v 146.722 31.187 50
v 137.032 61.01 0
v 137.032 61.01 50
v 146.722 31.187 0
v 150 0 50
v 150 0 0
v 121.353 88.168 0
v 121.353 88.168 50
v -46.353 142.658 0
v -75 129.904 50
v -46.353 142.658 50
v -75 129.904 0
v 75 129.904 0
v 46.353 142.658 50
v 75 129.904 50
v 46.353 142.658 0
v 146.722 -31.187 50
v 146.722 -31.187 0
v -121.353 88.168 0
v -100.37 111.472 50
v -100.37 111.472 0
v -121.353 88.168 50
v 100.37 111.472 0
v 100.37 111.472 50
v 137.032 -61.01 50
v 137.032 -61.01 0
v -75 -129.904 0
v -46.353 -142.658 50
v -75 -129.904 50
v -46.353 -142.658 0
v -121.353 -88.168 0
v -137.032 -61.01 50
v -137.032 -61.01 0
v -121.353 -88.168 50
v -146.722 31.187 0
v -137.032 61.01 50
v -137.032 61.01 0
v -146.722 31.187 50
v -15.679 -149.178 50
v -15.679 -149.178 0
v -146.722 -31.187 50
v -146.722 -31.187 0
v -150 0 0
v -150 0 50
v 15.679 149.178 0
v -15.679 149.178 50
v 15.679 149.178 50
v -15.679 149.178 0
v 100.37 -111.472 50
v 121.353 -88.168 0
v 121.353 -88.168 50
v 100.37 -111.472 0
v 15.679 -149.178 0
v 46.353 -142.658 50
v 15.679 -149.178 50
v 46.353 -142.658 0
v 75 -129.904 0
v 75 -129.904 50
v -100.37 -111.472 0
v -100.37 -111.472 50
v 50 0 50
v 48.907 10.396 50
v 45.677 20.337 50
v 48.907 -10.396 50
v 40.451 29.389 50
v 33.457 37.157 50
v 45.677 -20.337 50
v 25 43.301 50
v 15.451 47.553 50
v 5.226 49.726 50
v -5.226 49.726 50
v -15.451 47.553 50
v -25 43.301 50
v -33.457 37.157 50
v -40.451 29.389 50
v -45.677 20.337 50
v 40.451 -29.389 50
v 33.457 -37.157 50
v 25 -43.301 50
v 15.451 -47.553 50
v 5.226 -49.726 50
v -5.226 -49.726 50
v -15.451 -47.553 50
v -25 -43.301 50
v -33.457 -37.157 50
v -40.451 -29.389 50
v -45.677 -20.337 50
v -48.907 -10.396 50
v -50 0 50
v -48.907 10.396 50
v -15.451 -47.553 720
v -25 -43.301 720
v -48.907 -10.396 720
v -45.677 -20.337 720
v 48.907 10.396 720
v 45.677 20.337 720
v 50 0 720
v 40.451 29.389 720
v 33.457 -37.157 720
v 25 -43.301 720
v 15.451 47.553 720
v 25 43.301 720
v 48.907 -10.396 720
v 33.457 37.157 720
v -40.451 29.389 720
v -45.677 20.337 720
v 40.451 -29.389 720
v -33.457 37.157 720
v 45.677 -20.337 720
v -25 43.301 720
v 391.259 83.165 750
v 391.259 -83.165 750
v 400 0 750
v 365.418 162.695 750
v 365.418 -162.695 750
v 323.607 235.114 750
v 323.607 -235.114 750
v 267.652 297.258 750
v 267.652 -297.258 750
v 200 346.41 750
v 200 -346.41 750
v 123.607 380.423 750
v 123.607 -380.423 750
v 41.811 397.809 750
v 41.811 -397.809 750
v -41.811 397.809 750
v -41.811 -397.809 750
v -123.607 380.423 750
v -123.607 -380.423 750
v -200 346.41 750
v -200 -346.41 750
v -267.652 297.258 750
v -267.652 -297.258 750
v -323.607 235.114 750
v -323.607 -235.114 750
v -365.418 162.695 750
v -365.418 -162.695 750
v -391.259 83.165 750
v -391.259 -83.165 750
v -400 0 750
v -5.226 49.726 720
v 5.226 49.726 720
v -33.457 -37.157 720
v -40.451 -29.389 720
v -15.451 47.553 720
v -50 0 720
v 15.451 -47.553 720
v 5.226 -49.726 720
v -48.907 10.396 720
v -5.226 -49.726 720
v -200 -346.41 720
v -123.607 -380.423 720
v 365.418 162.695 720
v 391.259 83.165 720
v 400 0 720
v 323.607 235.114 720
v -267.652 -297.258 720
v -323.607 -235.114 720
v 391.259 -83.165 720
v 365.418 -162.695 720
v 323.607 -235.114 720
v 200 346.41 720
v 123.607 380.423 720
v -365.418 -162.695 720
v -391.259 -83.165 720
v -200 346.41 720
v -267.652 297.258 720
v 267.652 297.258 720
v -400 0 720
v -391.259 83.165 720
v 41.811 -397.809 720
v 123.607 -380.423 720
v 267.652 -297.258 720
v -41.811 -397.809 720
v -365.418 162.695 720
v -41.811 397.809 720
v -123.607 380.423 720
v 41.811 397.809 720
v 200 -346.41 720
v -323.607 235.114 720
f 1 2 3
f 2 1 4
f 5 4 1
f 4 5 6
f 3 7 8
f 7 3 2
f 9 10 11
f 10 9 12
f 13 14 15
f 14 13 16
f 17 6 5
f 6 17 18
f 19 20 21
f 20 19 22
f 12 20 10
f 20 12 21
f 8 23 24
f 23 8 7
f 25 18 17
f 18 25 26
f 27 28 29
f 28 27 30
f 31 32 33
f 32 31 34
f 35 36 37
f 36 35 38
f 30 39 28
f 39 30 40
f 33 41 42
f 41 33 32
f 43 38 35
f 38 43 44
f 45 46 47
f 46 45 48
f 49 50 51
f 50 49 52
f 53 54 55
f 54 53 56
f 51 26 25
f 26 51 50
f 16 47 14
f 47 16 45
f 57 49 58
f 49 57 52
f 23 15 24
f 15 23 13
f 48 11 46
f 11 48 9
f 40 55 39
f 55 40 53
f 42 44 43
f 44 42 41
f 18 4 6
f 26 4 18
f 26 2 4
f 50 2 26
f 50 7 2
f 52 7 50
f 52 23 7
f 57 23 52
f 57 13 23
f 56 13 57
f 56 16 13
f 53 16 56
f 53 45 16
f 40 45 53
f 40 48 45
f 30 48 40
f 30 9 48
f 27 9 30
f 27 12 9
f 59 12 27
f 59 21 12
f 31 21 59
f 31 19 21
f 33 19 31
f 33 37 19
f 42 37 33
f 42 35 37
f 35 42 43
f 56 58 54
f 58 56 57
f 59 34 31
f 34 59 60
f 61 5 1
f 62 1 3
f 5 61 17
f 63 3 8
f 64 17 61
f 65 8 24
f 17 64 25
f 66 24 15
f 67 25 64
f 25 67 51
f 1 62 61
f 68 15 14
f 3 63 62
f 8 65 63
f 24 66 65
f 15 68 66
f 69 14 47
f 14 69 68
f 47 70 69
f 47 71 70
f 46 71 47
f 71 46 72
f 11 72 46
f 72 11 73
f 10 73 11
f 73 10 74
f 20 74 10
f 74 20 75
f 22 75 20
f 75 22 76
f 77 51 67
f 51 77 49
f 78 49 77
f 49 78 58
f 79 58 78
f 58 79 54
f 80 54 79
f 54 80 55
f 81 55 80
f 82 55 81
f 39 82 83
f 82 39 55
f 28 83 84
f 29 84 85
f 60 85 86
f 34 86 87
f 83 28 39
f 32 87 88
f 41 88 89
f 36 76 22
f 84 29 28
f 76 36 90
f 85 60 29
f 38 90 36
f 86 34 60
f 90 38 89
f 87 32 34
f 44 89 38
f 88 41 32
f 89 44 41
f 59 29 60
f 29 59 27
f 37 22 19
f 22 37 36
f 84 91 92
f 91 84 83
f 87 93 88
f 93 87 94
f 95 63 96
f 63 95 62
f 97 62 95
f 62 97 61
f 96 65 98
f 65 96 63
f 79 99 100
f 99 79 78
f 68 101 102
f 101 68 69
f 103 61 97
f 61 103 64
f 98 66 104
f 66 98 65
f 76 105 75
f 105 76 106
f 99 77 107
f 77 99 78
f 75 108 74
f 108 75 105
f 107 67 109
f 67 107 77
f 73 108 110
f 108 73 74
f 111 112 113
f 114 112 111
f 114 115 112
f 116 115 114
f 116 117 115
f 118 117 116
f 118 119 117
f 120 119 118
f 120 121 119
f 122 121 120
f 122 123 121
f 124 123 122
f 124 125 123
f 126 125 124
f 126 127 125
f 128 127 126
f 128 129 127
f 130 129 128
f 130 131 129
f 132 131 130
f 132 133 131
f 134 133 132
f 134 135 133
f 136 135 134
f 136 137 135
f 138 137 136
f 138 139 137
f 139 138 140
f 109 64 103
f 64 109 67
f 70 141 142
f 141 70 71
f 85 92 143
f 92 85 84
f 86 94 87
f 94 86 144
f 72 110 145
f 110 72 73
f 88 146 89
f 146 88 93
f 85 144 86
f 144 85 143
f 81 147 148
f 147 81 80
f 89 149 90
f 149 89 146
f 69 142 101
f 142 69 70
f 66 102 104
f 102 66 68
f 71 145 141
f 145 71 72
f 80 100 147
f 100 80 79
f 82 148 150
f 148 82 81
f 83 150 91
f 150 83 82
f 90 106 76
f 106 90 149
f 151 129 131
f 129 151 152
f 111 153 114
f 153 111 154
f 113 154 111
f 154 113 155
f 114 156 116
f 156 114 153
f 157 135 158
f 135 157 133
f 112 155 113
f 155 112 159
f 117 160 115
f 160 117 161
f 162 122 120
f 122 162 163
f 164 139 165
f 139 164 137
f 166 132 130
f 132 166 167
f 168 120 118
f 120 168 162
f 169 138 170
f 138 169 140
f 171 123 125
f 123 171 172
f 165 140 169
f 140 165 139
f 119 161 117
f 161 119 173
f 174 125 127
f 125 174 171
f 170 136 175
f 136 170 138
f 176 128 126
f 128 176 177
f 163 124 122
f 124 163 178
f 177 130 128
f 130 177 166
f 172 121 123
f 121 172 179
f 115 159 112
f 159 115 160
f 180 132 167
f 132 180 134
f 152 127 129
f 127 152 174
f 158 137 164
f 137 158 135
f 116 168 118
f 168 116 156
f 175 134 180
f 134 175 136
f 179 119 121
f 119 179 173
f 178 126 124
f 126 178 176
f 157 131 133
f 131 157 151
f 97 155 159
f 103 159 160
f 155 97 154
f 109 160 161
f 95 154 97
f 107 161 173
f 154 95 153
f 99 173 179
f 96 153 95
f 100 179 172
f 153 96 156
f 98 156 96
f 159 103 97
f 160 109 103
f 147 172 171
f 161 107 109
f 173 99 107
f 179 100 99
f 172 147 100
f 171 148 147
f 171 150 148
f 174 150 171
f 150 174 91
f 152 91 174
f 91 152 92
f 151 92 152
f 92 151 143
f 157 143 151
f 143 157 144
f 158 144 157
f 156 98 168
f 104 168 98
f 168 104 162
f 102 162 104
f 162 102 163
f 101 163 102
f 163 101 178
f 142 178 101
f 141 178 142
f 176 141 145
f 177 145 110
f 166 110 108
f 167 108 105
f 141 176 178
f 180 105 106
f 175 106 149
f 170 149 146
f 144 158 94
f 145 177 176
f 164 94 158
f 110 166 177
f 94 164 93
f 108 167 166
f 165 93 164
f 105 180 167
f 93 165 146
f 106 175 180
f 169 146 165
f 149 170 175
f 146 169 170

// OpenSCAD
// Author: Mihai Oltean, www.tcreate.org, mihai.oltean@gmail.com
// More details: jenny5.org
// Source: github.com/jenny5-robot
// MIT License
//--------------------------------------------------------------

module rounded_table(height, radius)
{
    sheet_thickness = 30;
// base
	cylinder (h = 50, r = 150);
	// leg
	cylinder (h = height, r = 50);
	// top sheet
	translate ([0, 0, height - sheet_thickness]) cylinder (h = sheet_thickness, r = radius);
}
//--------------------------------------------------------------

rounded_table(750, 400);
